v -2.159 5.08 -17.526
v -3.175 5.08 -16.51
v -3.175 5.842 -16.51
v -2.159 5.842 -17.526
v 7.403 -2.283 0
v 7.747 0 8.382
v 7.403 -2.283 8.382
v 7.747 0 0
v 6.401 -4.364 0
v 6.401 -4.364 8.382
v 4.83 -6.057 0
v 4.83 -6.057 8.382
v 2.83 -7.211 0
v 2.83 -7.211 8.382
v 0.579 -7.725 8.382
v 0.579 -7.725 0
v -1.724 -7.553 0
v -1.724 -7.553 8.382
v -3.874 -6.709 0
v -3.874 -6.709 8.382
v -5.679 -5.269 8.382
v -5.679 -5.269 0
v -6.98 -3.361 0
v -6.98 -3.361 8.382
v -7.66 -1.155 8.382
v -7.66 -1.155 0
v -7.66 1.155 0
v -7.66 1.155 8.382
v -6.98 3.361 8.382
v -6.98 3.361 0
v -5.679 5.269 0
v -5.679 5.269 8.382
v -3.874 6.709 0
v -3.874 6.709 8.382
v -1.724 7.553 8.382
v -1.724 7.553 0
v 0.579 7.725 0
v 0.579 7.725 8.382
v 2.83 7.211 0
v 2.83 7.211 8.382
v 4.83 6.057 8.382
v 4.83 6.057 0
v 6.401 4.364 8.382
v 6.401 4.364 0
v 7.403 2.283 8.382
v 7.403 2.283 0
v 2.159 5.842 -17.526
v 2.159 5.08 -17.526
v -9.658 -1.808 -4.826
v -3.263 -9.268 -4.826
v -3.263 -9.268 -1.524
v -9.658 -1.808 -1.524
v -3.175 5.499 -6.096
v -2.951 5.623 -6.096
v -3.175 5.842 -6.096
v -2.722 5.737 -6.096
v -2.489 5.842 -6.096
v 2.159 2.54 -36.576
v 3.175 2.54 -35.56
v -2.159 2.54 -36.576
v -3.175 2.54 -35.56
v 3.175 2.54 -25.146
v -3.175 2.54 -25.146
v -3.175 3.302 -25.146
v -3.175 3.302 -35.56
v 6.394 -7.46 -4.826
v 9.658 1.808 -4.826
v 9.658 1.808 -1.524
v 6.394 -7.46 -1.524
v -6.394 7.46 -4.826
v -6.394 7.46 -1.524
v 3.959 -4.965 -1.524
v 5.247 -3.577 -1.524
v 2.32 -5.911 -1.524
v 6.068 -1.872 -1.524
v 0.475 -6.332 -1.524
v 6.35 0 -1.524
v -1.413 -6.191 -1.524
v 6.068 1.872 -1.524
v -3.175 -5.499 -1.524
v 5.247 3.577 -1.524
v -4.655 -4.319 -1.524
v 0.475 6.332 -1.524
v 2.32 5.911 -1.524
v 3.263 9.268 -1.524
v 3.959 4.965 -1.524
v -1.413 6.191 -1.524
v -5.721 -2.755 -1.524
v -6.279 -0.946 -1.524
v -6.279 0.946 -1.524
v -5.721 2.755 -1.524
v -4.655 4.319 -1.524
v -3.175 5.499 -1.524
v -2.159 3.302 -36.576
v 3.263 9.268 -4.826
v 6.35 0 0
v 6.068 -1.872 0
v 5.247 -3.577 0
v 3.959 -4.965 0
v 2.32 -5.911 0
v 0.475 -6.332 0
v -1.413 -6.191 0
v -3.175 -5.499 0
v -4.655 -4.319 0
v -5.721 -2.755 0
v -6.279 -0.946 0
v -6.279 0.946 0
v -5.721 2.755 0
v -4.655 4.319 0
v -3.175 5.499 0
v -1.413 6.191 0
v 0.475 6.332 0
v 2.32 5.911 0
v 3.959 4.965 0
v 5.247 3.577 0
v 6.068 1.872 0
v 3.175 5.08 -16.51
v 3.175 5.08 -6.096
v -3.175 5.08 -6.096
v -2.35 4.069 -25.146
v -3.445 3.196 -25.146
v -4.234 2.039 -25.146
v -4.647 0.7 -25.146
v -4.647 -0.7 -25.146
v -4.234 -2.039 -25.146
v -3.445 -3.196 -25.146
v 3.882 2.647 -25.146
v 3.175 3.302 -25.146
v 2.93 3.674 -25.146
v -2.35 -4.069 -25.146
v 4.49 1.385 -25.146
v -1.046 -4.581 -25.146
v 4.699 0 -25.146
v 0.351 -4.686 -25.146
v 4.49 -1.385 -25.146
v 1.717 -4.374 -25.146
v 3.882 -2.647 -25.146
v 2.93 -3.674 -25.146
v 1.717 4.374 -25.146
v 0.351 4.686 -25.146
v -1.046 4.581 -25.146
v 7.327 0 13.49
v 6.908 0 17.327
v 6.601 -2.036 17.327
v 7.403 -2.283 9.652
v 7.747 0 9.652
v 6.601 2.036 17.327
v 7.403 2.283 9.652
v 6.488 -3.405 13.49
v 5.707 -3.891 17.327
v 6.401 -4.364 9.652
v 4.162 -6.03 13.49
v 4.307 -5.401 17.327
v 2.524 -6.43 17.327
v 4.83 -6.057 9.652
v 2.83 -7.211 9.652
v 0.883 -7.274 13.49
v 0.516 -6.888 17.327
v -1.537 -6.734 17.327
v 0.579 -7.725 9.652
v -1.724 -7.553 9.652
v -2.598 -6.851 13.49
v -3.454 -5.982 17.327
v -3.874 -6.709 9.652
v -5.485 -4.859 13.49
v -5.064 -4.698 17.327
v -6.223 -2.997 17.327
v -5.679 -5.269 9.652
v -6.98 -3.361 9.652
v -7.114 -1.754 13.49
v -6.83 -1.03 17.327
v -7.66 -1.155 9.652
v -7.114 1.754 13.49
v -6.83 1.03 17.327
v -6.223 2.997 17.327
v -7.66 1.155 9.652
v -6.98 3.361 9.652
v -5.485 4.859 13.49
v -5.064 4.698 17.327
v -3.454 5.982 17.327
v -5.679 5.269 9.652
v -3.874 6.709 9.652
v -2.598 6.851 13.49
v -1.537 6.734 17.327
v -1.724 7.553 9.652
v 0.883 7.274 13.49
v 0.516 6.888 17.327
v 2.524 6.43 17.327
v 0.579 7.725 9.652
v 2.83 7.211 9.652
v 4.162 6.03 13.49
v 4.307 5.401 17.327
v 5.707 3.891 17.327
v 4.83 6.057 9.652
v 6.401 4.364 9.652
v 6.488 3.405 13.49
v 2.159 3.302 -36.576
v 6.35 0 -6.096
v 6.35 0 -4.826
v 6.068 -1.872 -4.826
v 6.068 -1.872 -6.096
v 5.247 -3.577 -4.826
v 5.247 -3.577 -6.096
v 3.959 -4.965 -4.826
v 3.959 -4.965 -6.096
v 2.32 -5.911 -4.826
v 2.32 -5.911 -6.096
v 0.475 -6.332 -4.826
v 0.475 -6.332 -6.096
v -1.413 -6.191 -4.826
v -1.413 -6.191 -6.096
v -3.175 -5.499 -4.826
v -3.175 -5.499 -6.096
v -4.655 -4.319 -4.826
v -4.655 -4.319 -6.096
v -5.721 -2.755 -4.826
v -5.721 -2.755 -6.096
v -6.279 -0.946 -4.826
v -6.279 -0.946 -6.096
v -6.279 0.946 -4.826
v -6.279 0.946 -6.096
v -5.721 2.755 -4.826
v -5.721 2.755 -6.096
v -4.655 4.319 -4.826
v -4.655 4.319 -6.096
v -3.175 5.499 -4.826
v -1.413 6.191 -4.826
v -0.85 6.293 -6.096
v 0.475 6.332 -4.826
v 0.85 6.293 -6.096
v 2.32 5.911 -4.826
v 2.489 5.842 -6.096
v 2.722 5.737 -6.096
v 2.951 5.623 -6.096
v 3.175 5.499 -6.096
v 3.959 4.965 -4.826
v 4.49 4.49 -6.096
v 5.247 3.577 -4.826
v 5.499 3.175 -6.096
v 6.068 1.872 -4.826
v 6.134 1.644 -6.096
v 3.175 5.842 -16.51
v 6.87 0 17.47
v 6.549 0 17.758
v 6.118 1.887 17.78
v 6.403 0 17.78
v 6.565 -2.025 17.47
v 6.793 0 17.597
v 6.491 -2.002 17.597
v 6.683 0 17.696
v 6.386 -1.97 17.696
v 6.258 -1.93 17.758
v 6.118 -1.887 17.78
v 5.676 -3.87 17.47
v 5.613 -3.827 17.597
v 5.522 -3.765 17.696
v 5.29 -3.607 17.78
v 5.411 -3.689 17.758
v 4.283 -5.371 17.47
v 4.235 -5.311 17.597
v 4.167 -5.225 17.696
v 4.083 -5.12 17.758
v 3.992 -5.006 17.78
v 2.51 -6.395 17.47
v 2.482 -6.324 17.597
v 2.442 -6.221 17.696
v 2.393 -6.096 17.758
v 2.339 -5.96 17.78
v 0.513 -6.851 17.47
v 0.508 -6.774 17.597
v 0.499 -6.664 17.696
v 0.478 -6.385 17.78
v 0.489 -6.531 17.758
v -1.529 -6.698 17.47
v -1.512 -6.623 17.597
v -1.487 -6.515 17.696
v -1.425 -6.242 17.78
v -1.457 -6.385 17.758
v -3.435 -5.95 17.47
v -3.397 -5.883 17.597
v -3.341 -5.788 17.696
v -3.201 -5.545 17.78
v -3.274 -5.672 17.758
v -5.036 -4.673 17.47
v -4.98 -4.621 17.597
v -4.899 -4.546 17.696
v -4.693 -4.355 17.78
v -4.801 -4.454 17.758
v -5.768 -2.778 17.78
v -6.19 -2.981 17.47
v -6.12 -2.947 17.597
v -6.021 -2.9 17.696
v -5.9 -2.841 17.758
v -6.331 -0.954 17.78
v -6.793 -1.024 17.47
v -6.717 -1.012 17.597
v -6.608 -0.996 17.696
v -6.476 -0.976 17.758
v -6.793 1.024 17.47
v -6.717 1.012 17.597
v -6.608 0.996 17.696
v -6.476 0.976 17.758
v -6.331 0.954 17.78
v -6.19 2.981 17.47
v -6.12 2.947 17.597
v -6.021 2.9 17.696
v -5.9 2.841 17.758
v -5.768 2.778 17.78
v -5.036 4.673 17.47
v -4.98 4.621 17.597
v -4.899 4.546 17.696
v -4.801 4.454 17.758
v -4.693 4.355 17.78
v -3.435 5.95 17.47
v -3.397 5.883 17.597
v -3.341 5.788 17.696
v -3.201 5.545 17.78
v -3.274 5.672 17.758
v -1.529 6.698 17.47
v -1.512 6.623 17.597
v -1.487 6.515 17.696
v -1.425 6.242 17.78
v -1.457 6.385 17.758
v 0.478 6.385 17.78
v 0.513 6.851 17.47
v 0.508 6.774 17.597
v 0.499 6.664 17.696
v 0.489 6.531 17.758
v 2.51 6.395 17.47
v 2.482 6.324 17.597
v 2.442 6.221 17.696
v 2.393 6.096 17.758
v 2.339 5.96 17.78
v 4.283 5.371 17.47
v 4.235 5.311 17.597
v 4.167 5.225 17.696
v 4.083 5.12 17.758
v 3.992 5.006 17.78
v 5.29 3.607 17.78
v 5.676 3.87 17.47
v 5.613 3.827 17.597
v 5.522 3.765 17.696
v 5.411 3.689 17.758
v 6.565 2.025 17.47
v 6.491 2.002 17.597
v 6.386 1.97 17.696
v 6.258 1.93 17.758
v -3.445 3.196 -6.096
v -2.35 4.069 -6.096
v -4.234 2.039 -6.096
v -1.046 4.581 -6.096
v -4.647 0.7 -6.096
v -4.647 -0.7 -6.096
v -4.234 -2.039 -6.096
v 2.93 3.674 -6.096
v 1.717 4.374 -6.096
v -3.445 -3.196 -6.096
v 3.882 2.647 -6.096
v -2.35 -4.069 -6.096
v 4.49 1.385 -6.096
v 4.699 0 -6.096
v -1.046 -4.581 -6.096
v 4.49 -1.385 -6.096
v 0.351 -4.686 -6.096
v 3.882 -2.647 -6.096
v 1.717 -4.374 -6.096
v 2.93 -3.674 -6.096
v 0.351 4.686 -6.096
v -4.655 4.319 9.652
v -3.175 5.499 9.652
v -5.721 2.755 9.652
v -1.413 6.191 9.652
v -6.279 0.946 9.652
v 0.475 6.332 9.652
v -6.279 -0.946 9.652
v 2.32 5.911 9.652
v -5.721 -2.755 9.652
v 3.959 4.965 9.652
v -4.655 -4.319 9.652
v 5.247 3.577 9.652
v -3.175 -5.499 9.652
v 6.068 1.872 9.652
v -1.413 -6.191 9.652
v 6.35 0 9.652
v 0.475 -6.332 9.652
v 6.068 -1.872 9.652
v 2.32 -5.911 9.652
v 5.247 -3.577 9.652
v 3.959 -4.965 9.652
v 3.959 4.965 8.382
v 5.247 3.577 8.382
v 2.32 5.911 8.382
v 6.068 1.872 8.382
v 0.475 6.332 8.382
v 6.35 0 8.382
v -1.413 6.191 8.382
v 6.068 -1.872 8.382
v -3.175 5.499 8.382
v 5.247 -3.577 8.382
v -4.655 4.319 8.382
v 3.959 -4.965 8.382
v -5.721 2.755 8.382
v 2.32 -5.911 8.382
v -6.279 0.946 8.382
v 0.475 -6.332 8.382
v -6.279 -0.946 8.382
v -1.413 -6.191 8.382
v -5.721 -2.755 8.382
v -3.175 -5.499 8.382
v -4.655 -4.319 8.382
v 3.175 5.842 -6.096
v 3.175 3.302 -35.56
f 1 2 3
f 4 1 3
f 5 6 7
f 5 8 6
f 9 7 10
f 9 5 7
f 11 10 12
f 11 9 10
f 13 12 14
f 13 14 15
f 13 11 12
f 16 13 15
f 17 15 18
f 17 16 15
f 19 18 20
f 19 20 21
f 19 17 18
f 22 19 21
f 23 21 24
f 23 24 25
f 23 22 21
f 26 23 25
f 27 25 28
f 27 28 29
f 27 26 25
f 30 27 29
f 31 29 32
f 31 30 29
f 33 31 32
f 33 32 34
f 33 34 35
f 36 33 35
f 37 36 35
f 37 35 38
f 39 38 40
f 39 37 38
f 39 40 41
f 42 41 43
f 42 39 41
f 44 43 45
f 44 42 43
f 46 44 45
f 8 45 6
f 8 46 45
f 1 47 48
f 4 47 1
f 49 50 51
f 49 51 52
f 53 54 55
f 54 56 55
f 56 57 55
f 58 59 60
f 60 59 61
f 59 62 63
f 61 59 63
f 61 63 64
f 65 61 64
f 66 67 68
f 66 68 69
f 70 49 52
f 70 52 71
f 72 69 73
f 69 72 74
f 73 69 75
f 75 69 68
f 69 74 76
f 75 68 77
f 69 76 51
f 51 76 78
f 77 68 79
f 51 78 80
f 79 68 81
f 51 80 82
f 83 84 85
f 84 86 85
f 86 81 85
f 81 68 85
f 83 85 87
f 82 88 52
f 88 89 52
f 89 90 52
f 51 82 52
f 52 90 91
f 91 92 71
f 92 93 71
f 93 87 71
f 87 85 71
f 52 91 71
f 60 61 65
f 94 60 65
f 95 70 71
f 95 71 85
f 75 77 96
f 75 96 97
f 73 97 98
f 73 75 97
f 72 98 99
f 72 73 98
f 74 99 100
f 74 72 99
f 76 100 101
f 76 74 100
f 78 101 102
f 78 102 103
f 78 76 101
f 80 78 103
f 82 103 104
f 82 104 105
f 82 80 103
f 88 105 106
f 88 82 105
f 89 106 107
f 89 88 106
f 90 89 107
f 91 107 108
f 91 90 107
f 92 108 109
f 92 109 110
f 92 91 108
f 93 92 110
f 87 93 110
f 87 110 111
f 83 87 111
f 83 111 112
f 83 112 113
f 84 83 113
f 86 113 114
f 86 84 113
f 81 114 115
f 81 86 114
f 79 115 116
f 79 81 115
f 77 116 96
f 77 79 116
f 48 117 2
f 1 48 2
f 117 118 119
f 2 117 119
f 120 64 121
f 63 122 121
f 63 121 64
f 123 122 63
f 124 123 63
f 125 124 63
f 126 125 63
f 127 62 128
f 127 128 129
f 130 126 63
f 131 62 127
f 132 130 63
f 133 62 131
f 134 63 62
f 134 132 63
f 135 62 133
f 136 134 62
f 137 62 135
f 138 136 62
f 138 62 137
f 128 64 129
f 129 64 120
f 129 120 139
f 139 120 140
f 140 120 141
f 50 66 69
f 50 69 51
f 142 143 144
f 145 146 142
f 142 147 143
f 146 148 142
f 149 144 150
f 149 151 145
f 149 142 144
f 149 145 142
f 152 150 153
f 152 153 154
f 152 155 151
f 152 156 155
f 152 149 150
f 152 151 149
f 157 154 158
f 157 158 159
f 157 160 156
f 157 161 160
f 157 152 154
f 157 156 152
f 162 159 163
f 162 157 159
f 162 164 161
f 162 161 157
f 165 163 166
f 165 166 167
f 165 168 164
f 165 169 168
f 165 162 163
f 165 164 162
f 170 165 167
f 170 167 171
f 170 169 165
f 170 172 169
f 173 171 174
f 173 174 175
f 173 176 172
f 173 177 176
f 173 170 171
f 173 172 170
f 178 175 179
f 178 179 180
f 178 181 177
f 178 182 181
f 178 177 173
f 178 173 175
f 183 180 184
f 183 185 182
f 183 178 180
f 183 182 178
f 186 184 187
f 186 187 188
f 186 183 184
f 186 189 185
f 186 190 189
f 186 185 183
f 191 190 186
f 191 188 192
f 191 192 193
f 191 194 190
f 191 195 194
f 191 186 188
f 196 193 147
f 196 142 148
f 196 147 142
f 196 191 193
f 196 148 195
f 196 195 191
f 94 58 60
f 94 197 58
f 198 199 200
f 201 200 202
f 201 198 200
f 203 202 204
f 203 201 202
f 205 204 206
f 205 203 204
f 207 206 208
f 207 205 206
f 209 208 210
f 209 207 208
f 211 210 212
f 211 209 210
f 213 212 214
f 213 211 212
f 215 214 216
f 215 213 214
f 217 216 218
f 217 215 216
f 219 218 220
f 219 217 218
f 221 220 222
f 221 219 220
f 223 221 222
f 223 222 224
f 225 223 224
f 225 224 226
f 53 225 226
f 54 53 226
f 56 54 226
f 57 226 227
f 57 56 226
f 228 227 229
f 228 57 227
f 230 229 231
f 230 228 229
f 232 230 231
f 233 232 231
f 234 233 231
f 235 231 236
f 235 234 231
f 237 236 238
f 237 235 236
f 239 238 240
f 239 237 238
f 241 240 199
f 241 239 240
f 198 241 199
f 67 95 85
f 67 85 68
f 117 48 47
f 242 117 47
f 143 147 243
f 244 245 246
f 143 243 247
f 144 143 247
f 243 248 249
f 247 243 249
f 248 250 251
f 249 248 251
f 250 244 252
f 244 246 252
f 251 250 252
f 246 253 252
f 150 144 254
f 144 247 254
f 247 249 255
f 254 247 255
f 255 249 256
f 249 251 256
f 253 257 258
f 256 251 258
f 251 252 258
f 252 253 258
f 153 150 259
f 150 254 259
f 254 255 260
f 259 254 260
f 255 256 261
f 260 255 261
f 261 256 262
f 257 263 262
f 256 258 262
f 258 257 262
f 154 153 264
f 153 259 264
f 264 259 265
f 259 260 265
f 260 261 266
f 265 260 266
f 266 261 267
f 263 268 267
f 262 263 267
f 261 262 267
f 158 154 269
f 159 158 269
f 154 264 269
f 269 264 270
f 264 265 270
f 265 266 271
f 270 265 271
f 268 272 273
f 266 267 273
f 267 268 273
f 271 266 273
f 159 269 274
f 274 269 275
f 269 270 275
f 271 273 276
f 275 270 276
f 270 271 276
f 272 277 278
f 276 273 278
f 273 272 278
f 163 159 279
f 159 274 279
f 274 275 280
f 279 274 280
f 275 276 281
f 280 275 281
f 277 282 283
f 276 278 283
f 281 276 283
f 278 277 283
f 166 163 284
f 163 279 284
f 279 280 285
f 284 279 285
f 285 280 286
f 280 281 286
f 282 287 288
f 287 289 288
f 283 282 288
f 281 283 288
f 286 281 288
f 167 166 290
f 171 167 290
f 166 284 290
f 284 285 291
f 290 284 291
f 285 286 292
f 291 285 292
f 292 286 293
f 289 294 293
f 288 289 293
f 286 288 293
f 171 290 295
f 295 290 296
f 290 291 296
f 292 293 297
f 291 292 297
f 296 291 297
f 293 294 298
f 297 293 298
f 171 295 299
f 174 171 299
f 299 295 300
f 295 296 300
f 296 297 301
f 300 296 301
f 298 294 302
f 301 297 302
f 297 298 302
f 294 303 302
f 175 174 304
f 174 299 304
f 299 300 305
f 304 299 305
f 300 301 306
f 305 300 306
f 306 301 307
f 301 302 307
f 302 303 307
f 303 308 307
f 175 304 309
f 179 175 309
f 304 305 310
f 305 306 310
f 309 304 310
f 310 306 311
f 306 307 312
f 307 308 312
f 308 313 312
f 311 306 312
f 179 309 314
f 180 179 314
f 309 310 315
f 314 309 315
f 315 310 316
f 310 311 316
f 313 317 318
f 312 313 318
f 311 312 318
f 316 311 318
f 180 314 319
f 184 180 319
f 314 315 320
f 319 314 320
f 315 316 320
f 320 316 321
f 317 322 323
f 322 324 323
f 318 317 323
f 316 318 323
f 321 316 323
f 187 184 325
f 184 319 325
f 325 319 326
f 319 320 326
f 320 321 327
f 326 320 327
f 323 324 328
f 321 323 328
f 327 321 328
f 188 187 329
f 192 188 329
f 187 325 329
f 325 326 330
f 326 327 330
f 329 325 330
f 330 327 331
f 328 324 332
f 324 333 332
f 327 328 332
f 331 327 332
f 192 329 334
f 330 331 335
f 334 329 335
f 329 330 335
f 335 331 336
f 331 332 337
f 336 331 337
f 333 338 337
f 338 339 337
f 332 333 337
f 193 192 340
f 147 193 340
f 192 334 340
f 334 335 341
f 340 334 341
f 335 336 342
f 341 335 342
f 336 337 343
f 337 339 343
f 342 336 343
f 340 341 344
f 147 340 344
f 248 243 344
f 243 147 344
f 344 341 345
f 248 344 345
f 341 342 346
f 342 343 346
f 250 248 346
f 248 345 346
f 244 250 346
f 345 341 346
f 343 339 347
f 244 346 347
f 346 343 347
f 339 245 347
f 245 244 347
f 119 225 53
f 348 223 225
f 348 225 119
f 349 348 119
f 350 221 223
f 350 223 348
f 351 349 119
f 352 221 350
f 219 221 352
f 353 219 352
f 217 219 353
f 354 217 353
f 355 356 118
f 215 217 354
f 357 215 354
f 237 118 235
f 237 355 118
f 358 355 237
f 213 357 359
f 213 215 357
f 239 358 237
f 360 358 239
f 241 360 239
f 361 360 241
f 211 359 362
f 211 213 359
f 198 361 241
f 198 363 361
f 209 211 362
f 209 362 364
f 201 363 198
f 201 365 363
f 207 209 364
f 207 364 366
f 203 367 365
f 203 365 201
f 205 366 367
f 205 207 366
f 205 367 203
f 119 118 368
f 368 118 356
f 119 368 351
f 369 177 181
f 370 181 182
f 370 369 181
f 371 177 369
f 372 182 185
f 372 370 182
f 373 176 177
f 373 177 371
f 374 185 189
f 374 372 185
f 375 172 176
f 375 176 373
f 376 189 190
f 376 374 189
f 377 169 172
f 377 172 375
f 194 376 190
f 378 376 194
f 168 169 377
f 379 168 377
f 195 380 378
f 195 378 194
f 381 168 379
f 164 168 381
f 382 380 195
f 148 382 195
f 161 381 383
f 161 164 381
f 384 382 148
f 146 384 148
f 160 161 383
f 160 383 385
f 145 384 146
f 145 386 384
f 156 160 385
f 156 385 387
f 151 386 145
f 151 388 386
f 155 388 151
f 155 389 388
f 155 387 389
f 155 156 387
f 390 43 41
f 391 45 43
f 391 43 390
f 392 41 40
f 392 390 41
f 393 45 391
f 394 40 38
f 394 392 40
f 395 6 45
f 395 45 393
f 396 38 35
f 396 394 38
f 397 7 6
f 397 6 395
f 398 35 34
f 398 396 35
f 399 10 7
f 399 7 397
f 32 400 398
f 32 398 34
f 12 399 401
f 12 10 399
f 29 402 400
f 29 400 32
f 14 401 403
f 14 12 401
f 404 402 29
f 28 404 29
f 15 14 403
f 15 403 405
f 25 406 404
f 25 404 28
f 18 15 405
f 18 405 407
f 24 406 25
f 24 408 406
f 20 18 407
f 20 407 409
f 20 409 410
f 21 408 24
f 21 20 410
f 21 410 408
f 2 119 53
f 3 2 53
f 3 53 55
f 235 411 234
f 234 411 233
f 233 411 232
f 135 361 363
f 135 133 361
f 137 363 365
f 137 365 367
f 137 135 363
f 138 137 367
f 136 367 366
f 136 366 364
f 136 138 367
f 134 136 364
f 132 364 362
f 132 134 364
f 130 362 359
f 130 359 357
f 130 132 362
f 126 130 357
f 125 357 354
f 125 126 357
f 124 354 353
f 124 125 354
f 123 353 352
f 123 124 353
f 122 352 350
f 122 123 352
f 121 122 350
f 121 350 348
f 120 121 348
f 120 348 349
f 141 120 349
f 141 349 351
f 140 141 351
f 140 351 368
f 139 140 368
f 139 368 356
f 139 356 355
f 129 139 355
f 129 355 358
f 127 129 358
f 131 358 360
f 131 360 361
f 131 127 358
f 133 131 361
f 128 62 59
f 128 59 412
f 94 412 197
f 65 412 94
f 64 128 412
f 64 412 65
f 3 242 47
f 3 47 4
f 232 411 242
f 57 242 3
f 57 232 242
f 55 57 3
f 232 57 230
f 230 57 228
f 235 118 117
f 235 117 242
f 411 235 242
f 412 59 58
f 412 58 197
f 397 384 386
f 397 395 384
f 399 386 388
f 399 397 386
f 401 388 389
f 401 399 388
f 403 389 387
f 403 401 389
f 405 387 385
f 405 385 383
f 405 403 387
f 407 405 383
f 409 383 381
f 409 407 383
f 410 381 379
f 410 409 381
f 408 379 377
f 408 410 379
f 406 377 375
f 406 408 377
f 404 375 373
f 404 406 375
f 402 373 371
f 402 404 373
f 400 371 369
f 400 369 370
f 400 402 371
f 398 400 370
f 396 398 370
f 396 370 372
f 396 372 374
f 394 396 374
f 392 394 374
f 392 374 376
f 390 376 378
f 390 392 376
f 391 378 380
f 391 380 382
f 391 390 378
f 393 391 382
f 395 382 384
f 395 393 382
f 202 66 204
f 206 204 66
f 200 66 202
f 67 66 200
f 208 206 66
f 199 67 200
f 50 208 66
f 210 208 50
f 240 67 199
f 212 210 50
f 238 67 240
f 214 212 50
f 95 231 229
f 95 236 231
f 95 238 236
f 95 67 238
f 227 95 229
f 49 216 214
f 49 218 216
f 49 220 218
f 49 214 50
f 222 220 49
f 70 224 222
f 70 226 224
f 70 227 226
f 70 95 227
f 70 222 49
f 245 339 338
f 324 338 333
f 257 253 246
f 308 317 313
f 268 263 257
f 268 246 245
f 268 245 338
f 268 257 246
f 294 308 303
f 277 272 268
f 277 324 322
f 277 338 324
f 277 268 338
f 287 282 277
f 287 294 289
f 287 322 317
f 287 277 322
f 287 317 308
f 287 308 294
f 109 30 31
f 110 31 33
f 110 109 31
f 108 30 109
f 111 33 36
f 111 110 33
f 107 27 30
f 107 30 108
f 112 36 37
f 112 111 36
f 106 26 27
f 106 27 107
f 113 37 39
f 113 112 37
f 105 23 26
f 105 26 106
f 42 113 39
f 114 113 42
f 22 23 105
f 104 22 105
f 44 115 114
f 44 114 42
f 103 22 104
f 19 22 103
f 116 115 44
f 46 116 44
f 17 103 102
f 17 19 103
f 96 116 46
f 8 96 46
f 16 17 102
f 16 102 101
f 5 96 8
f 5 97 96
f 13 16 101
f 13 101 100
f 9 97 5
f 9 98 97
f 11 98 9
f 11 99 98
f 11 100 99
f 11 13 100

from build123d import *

# Parameters (mm, degrees)
BOSS_EXTRUDE1_DEPTH = 3.302
FILLET1_R           = 0.508
SKETCH3_W           = 6.35
SKETCH3_H           = 0.762
BOSS_EXTRUDE2_DEPTH = 11.43
SKETCH4_W           = 6.35
SKETCH4_H           = 0.762
BOSS_EXTRUDE3_DEPTH = 11.43
CHAMFER1_SIZE       = 1.016


with BuildPart() as part:
    # Sketch1 → Base-Revolve (revolve)
    with BuildSketch(Plane(origin=(0, 0, 0), x_dir=(1, 0, 0), z_dir=(0, 1, 0))):
        Polygon((0, -17.78), (6.858, -17.78), (7.747, -9.652), (6.35, -9.652), (6.35, -8.382), (7.747, -8.382), (7.747, 0), (6.35, 0), (6.35, 6.096), (4.699, 6.096), (4.699, 25.146), (0, 25.146), align=None)
    revolve(axis=Axis((0, 0, 0), (0, 0, -1)))

    # Sketch2 → Boss-Extrude1 (add)
    with BuildSketch(Plane(origin=(0, 0, -4.826), x_dir=(-1, 0, 0), z_dir=(0, 0, -1))):
        Polygon((-6.394250991, -7.45995949), (3.263388934, -9.267563542), (9.657639925, -1.807604052), (6.394250991, 7.45995949), (-3.263388934, 9.267563542), (-9.657639925, 1.807604052), align=None)
    extrude(amount=-BOSS_EXTRUDE1_DEPTH)

    # Fillet1
    fillet1_edges = [part.edges().sort_by_distance(p)[0] for p in [
        (-6.858, 0, 17.78),
    ]]
    fillet(fillet1_edges, radius=FILLET1_R)

    # Sketch3 → Boss-Extrude2 (add)
    with BuildSketch(Plane(origin=(0, 0, -25.146), x_dir=(-1, 0, 0), z_dir=(0, 0, -1))):
        with Locations((0, 2.921)):
            Rectangle(SKETCH3_W, SKETCH3_H)
    extrude(amount=BOSS_EXTRUDE2_DEPTH)

    # Sketch4 → Boss-Extrude3 (add)
    with BuildSketch(Plane(origin=(-0.217554927, 1.748253857, -6.096), x_dir=(-1, 0, 0), z_dir=(0, 0, -1))):
        with Locations((-0.217554927, 3.712746143)):
            Rectangle(SKETCH4_W, SKETCH4_H)
    extrude(amount=BOSS_EXTRUDE3_DEPTH)

    # Chamfer1
    chamfer1_edges = [part.edges().sort_by_distance(p)[0] for p in [
        (3.175, 5.461, -17.526),
        (-3.175, 5.461, -17.526),
        (-3.175, 2.921, -36.576),
        (3.175, 2.921, -36.576),
    ]]
    chamfer(chamfer1_edges, length=CHAMFER1_SIZE)


solid = part.part
